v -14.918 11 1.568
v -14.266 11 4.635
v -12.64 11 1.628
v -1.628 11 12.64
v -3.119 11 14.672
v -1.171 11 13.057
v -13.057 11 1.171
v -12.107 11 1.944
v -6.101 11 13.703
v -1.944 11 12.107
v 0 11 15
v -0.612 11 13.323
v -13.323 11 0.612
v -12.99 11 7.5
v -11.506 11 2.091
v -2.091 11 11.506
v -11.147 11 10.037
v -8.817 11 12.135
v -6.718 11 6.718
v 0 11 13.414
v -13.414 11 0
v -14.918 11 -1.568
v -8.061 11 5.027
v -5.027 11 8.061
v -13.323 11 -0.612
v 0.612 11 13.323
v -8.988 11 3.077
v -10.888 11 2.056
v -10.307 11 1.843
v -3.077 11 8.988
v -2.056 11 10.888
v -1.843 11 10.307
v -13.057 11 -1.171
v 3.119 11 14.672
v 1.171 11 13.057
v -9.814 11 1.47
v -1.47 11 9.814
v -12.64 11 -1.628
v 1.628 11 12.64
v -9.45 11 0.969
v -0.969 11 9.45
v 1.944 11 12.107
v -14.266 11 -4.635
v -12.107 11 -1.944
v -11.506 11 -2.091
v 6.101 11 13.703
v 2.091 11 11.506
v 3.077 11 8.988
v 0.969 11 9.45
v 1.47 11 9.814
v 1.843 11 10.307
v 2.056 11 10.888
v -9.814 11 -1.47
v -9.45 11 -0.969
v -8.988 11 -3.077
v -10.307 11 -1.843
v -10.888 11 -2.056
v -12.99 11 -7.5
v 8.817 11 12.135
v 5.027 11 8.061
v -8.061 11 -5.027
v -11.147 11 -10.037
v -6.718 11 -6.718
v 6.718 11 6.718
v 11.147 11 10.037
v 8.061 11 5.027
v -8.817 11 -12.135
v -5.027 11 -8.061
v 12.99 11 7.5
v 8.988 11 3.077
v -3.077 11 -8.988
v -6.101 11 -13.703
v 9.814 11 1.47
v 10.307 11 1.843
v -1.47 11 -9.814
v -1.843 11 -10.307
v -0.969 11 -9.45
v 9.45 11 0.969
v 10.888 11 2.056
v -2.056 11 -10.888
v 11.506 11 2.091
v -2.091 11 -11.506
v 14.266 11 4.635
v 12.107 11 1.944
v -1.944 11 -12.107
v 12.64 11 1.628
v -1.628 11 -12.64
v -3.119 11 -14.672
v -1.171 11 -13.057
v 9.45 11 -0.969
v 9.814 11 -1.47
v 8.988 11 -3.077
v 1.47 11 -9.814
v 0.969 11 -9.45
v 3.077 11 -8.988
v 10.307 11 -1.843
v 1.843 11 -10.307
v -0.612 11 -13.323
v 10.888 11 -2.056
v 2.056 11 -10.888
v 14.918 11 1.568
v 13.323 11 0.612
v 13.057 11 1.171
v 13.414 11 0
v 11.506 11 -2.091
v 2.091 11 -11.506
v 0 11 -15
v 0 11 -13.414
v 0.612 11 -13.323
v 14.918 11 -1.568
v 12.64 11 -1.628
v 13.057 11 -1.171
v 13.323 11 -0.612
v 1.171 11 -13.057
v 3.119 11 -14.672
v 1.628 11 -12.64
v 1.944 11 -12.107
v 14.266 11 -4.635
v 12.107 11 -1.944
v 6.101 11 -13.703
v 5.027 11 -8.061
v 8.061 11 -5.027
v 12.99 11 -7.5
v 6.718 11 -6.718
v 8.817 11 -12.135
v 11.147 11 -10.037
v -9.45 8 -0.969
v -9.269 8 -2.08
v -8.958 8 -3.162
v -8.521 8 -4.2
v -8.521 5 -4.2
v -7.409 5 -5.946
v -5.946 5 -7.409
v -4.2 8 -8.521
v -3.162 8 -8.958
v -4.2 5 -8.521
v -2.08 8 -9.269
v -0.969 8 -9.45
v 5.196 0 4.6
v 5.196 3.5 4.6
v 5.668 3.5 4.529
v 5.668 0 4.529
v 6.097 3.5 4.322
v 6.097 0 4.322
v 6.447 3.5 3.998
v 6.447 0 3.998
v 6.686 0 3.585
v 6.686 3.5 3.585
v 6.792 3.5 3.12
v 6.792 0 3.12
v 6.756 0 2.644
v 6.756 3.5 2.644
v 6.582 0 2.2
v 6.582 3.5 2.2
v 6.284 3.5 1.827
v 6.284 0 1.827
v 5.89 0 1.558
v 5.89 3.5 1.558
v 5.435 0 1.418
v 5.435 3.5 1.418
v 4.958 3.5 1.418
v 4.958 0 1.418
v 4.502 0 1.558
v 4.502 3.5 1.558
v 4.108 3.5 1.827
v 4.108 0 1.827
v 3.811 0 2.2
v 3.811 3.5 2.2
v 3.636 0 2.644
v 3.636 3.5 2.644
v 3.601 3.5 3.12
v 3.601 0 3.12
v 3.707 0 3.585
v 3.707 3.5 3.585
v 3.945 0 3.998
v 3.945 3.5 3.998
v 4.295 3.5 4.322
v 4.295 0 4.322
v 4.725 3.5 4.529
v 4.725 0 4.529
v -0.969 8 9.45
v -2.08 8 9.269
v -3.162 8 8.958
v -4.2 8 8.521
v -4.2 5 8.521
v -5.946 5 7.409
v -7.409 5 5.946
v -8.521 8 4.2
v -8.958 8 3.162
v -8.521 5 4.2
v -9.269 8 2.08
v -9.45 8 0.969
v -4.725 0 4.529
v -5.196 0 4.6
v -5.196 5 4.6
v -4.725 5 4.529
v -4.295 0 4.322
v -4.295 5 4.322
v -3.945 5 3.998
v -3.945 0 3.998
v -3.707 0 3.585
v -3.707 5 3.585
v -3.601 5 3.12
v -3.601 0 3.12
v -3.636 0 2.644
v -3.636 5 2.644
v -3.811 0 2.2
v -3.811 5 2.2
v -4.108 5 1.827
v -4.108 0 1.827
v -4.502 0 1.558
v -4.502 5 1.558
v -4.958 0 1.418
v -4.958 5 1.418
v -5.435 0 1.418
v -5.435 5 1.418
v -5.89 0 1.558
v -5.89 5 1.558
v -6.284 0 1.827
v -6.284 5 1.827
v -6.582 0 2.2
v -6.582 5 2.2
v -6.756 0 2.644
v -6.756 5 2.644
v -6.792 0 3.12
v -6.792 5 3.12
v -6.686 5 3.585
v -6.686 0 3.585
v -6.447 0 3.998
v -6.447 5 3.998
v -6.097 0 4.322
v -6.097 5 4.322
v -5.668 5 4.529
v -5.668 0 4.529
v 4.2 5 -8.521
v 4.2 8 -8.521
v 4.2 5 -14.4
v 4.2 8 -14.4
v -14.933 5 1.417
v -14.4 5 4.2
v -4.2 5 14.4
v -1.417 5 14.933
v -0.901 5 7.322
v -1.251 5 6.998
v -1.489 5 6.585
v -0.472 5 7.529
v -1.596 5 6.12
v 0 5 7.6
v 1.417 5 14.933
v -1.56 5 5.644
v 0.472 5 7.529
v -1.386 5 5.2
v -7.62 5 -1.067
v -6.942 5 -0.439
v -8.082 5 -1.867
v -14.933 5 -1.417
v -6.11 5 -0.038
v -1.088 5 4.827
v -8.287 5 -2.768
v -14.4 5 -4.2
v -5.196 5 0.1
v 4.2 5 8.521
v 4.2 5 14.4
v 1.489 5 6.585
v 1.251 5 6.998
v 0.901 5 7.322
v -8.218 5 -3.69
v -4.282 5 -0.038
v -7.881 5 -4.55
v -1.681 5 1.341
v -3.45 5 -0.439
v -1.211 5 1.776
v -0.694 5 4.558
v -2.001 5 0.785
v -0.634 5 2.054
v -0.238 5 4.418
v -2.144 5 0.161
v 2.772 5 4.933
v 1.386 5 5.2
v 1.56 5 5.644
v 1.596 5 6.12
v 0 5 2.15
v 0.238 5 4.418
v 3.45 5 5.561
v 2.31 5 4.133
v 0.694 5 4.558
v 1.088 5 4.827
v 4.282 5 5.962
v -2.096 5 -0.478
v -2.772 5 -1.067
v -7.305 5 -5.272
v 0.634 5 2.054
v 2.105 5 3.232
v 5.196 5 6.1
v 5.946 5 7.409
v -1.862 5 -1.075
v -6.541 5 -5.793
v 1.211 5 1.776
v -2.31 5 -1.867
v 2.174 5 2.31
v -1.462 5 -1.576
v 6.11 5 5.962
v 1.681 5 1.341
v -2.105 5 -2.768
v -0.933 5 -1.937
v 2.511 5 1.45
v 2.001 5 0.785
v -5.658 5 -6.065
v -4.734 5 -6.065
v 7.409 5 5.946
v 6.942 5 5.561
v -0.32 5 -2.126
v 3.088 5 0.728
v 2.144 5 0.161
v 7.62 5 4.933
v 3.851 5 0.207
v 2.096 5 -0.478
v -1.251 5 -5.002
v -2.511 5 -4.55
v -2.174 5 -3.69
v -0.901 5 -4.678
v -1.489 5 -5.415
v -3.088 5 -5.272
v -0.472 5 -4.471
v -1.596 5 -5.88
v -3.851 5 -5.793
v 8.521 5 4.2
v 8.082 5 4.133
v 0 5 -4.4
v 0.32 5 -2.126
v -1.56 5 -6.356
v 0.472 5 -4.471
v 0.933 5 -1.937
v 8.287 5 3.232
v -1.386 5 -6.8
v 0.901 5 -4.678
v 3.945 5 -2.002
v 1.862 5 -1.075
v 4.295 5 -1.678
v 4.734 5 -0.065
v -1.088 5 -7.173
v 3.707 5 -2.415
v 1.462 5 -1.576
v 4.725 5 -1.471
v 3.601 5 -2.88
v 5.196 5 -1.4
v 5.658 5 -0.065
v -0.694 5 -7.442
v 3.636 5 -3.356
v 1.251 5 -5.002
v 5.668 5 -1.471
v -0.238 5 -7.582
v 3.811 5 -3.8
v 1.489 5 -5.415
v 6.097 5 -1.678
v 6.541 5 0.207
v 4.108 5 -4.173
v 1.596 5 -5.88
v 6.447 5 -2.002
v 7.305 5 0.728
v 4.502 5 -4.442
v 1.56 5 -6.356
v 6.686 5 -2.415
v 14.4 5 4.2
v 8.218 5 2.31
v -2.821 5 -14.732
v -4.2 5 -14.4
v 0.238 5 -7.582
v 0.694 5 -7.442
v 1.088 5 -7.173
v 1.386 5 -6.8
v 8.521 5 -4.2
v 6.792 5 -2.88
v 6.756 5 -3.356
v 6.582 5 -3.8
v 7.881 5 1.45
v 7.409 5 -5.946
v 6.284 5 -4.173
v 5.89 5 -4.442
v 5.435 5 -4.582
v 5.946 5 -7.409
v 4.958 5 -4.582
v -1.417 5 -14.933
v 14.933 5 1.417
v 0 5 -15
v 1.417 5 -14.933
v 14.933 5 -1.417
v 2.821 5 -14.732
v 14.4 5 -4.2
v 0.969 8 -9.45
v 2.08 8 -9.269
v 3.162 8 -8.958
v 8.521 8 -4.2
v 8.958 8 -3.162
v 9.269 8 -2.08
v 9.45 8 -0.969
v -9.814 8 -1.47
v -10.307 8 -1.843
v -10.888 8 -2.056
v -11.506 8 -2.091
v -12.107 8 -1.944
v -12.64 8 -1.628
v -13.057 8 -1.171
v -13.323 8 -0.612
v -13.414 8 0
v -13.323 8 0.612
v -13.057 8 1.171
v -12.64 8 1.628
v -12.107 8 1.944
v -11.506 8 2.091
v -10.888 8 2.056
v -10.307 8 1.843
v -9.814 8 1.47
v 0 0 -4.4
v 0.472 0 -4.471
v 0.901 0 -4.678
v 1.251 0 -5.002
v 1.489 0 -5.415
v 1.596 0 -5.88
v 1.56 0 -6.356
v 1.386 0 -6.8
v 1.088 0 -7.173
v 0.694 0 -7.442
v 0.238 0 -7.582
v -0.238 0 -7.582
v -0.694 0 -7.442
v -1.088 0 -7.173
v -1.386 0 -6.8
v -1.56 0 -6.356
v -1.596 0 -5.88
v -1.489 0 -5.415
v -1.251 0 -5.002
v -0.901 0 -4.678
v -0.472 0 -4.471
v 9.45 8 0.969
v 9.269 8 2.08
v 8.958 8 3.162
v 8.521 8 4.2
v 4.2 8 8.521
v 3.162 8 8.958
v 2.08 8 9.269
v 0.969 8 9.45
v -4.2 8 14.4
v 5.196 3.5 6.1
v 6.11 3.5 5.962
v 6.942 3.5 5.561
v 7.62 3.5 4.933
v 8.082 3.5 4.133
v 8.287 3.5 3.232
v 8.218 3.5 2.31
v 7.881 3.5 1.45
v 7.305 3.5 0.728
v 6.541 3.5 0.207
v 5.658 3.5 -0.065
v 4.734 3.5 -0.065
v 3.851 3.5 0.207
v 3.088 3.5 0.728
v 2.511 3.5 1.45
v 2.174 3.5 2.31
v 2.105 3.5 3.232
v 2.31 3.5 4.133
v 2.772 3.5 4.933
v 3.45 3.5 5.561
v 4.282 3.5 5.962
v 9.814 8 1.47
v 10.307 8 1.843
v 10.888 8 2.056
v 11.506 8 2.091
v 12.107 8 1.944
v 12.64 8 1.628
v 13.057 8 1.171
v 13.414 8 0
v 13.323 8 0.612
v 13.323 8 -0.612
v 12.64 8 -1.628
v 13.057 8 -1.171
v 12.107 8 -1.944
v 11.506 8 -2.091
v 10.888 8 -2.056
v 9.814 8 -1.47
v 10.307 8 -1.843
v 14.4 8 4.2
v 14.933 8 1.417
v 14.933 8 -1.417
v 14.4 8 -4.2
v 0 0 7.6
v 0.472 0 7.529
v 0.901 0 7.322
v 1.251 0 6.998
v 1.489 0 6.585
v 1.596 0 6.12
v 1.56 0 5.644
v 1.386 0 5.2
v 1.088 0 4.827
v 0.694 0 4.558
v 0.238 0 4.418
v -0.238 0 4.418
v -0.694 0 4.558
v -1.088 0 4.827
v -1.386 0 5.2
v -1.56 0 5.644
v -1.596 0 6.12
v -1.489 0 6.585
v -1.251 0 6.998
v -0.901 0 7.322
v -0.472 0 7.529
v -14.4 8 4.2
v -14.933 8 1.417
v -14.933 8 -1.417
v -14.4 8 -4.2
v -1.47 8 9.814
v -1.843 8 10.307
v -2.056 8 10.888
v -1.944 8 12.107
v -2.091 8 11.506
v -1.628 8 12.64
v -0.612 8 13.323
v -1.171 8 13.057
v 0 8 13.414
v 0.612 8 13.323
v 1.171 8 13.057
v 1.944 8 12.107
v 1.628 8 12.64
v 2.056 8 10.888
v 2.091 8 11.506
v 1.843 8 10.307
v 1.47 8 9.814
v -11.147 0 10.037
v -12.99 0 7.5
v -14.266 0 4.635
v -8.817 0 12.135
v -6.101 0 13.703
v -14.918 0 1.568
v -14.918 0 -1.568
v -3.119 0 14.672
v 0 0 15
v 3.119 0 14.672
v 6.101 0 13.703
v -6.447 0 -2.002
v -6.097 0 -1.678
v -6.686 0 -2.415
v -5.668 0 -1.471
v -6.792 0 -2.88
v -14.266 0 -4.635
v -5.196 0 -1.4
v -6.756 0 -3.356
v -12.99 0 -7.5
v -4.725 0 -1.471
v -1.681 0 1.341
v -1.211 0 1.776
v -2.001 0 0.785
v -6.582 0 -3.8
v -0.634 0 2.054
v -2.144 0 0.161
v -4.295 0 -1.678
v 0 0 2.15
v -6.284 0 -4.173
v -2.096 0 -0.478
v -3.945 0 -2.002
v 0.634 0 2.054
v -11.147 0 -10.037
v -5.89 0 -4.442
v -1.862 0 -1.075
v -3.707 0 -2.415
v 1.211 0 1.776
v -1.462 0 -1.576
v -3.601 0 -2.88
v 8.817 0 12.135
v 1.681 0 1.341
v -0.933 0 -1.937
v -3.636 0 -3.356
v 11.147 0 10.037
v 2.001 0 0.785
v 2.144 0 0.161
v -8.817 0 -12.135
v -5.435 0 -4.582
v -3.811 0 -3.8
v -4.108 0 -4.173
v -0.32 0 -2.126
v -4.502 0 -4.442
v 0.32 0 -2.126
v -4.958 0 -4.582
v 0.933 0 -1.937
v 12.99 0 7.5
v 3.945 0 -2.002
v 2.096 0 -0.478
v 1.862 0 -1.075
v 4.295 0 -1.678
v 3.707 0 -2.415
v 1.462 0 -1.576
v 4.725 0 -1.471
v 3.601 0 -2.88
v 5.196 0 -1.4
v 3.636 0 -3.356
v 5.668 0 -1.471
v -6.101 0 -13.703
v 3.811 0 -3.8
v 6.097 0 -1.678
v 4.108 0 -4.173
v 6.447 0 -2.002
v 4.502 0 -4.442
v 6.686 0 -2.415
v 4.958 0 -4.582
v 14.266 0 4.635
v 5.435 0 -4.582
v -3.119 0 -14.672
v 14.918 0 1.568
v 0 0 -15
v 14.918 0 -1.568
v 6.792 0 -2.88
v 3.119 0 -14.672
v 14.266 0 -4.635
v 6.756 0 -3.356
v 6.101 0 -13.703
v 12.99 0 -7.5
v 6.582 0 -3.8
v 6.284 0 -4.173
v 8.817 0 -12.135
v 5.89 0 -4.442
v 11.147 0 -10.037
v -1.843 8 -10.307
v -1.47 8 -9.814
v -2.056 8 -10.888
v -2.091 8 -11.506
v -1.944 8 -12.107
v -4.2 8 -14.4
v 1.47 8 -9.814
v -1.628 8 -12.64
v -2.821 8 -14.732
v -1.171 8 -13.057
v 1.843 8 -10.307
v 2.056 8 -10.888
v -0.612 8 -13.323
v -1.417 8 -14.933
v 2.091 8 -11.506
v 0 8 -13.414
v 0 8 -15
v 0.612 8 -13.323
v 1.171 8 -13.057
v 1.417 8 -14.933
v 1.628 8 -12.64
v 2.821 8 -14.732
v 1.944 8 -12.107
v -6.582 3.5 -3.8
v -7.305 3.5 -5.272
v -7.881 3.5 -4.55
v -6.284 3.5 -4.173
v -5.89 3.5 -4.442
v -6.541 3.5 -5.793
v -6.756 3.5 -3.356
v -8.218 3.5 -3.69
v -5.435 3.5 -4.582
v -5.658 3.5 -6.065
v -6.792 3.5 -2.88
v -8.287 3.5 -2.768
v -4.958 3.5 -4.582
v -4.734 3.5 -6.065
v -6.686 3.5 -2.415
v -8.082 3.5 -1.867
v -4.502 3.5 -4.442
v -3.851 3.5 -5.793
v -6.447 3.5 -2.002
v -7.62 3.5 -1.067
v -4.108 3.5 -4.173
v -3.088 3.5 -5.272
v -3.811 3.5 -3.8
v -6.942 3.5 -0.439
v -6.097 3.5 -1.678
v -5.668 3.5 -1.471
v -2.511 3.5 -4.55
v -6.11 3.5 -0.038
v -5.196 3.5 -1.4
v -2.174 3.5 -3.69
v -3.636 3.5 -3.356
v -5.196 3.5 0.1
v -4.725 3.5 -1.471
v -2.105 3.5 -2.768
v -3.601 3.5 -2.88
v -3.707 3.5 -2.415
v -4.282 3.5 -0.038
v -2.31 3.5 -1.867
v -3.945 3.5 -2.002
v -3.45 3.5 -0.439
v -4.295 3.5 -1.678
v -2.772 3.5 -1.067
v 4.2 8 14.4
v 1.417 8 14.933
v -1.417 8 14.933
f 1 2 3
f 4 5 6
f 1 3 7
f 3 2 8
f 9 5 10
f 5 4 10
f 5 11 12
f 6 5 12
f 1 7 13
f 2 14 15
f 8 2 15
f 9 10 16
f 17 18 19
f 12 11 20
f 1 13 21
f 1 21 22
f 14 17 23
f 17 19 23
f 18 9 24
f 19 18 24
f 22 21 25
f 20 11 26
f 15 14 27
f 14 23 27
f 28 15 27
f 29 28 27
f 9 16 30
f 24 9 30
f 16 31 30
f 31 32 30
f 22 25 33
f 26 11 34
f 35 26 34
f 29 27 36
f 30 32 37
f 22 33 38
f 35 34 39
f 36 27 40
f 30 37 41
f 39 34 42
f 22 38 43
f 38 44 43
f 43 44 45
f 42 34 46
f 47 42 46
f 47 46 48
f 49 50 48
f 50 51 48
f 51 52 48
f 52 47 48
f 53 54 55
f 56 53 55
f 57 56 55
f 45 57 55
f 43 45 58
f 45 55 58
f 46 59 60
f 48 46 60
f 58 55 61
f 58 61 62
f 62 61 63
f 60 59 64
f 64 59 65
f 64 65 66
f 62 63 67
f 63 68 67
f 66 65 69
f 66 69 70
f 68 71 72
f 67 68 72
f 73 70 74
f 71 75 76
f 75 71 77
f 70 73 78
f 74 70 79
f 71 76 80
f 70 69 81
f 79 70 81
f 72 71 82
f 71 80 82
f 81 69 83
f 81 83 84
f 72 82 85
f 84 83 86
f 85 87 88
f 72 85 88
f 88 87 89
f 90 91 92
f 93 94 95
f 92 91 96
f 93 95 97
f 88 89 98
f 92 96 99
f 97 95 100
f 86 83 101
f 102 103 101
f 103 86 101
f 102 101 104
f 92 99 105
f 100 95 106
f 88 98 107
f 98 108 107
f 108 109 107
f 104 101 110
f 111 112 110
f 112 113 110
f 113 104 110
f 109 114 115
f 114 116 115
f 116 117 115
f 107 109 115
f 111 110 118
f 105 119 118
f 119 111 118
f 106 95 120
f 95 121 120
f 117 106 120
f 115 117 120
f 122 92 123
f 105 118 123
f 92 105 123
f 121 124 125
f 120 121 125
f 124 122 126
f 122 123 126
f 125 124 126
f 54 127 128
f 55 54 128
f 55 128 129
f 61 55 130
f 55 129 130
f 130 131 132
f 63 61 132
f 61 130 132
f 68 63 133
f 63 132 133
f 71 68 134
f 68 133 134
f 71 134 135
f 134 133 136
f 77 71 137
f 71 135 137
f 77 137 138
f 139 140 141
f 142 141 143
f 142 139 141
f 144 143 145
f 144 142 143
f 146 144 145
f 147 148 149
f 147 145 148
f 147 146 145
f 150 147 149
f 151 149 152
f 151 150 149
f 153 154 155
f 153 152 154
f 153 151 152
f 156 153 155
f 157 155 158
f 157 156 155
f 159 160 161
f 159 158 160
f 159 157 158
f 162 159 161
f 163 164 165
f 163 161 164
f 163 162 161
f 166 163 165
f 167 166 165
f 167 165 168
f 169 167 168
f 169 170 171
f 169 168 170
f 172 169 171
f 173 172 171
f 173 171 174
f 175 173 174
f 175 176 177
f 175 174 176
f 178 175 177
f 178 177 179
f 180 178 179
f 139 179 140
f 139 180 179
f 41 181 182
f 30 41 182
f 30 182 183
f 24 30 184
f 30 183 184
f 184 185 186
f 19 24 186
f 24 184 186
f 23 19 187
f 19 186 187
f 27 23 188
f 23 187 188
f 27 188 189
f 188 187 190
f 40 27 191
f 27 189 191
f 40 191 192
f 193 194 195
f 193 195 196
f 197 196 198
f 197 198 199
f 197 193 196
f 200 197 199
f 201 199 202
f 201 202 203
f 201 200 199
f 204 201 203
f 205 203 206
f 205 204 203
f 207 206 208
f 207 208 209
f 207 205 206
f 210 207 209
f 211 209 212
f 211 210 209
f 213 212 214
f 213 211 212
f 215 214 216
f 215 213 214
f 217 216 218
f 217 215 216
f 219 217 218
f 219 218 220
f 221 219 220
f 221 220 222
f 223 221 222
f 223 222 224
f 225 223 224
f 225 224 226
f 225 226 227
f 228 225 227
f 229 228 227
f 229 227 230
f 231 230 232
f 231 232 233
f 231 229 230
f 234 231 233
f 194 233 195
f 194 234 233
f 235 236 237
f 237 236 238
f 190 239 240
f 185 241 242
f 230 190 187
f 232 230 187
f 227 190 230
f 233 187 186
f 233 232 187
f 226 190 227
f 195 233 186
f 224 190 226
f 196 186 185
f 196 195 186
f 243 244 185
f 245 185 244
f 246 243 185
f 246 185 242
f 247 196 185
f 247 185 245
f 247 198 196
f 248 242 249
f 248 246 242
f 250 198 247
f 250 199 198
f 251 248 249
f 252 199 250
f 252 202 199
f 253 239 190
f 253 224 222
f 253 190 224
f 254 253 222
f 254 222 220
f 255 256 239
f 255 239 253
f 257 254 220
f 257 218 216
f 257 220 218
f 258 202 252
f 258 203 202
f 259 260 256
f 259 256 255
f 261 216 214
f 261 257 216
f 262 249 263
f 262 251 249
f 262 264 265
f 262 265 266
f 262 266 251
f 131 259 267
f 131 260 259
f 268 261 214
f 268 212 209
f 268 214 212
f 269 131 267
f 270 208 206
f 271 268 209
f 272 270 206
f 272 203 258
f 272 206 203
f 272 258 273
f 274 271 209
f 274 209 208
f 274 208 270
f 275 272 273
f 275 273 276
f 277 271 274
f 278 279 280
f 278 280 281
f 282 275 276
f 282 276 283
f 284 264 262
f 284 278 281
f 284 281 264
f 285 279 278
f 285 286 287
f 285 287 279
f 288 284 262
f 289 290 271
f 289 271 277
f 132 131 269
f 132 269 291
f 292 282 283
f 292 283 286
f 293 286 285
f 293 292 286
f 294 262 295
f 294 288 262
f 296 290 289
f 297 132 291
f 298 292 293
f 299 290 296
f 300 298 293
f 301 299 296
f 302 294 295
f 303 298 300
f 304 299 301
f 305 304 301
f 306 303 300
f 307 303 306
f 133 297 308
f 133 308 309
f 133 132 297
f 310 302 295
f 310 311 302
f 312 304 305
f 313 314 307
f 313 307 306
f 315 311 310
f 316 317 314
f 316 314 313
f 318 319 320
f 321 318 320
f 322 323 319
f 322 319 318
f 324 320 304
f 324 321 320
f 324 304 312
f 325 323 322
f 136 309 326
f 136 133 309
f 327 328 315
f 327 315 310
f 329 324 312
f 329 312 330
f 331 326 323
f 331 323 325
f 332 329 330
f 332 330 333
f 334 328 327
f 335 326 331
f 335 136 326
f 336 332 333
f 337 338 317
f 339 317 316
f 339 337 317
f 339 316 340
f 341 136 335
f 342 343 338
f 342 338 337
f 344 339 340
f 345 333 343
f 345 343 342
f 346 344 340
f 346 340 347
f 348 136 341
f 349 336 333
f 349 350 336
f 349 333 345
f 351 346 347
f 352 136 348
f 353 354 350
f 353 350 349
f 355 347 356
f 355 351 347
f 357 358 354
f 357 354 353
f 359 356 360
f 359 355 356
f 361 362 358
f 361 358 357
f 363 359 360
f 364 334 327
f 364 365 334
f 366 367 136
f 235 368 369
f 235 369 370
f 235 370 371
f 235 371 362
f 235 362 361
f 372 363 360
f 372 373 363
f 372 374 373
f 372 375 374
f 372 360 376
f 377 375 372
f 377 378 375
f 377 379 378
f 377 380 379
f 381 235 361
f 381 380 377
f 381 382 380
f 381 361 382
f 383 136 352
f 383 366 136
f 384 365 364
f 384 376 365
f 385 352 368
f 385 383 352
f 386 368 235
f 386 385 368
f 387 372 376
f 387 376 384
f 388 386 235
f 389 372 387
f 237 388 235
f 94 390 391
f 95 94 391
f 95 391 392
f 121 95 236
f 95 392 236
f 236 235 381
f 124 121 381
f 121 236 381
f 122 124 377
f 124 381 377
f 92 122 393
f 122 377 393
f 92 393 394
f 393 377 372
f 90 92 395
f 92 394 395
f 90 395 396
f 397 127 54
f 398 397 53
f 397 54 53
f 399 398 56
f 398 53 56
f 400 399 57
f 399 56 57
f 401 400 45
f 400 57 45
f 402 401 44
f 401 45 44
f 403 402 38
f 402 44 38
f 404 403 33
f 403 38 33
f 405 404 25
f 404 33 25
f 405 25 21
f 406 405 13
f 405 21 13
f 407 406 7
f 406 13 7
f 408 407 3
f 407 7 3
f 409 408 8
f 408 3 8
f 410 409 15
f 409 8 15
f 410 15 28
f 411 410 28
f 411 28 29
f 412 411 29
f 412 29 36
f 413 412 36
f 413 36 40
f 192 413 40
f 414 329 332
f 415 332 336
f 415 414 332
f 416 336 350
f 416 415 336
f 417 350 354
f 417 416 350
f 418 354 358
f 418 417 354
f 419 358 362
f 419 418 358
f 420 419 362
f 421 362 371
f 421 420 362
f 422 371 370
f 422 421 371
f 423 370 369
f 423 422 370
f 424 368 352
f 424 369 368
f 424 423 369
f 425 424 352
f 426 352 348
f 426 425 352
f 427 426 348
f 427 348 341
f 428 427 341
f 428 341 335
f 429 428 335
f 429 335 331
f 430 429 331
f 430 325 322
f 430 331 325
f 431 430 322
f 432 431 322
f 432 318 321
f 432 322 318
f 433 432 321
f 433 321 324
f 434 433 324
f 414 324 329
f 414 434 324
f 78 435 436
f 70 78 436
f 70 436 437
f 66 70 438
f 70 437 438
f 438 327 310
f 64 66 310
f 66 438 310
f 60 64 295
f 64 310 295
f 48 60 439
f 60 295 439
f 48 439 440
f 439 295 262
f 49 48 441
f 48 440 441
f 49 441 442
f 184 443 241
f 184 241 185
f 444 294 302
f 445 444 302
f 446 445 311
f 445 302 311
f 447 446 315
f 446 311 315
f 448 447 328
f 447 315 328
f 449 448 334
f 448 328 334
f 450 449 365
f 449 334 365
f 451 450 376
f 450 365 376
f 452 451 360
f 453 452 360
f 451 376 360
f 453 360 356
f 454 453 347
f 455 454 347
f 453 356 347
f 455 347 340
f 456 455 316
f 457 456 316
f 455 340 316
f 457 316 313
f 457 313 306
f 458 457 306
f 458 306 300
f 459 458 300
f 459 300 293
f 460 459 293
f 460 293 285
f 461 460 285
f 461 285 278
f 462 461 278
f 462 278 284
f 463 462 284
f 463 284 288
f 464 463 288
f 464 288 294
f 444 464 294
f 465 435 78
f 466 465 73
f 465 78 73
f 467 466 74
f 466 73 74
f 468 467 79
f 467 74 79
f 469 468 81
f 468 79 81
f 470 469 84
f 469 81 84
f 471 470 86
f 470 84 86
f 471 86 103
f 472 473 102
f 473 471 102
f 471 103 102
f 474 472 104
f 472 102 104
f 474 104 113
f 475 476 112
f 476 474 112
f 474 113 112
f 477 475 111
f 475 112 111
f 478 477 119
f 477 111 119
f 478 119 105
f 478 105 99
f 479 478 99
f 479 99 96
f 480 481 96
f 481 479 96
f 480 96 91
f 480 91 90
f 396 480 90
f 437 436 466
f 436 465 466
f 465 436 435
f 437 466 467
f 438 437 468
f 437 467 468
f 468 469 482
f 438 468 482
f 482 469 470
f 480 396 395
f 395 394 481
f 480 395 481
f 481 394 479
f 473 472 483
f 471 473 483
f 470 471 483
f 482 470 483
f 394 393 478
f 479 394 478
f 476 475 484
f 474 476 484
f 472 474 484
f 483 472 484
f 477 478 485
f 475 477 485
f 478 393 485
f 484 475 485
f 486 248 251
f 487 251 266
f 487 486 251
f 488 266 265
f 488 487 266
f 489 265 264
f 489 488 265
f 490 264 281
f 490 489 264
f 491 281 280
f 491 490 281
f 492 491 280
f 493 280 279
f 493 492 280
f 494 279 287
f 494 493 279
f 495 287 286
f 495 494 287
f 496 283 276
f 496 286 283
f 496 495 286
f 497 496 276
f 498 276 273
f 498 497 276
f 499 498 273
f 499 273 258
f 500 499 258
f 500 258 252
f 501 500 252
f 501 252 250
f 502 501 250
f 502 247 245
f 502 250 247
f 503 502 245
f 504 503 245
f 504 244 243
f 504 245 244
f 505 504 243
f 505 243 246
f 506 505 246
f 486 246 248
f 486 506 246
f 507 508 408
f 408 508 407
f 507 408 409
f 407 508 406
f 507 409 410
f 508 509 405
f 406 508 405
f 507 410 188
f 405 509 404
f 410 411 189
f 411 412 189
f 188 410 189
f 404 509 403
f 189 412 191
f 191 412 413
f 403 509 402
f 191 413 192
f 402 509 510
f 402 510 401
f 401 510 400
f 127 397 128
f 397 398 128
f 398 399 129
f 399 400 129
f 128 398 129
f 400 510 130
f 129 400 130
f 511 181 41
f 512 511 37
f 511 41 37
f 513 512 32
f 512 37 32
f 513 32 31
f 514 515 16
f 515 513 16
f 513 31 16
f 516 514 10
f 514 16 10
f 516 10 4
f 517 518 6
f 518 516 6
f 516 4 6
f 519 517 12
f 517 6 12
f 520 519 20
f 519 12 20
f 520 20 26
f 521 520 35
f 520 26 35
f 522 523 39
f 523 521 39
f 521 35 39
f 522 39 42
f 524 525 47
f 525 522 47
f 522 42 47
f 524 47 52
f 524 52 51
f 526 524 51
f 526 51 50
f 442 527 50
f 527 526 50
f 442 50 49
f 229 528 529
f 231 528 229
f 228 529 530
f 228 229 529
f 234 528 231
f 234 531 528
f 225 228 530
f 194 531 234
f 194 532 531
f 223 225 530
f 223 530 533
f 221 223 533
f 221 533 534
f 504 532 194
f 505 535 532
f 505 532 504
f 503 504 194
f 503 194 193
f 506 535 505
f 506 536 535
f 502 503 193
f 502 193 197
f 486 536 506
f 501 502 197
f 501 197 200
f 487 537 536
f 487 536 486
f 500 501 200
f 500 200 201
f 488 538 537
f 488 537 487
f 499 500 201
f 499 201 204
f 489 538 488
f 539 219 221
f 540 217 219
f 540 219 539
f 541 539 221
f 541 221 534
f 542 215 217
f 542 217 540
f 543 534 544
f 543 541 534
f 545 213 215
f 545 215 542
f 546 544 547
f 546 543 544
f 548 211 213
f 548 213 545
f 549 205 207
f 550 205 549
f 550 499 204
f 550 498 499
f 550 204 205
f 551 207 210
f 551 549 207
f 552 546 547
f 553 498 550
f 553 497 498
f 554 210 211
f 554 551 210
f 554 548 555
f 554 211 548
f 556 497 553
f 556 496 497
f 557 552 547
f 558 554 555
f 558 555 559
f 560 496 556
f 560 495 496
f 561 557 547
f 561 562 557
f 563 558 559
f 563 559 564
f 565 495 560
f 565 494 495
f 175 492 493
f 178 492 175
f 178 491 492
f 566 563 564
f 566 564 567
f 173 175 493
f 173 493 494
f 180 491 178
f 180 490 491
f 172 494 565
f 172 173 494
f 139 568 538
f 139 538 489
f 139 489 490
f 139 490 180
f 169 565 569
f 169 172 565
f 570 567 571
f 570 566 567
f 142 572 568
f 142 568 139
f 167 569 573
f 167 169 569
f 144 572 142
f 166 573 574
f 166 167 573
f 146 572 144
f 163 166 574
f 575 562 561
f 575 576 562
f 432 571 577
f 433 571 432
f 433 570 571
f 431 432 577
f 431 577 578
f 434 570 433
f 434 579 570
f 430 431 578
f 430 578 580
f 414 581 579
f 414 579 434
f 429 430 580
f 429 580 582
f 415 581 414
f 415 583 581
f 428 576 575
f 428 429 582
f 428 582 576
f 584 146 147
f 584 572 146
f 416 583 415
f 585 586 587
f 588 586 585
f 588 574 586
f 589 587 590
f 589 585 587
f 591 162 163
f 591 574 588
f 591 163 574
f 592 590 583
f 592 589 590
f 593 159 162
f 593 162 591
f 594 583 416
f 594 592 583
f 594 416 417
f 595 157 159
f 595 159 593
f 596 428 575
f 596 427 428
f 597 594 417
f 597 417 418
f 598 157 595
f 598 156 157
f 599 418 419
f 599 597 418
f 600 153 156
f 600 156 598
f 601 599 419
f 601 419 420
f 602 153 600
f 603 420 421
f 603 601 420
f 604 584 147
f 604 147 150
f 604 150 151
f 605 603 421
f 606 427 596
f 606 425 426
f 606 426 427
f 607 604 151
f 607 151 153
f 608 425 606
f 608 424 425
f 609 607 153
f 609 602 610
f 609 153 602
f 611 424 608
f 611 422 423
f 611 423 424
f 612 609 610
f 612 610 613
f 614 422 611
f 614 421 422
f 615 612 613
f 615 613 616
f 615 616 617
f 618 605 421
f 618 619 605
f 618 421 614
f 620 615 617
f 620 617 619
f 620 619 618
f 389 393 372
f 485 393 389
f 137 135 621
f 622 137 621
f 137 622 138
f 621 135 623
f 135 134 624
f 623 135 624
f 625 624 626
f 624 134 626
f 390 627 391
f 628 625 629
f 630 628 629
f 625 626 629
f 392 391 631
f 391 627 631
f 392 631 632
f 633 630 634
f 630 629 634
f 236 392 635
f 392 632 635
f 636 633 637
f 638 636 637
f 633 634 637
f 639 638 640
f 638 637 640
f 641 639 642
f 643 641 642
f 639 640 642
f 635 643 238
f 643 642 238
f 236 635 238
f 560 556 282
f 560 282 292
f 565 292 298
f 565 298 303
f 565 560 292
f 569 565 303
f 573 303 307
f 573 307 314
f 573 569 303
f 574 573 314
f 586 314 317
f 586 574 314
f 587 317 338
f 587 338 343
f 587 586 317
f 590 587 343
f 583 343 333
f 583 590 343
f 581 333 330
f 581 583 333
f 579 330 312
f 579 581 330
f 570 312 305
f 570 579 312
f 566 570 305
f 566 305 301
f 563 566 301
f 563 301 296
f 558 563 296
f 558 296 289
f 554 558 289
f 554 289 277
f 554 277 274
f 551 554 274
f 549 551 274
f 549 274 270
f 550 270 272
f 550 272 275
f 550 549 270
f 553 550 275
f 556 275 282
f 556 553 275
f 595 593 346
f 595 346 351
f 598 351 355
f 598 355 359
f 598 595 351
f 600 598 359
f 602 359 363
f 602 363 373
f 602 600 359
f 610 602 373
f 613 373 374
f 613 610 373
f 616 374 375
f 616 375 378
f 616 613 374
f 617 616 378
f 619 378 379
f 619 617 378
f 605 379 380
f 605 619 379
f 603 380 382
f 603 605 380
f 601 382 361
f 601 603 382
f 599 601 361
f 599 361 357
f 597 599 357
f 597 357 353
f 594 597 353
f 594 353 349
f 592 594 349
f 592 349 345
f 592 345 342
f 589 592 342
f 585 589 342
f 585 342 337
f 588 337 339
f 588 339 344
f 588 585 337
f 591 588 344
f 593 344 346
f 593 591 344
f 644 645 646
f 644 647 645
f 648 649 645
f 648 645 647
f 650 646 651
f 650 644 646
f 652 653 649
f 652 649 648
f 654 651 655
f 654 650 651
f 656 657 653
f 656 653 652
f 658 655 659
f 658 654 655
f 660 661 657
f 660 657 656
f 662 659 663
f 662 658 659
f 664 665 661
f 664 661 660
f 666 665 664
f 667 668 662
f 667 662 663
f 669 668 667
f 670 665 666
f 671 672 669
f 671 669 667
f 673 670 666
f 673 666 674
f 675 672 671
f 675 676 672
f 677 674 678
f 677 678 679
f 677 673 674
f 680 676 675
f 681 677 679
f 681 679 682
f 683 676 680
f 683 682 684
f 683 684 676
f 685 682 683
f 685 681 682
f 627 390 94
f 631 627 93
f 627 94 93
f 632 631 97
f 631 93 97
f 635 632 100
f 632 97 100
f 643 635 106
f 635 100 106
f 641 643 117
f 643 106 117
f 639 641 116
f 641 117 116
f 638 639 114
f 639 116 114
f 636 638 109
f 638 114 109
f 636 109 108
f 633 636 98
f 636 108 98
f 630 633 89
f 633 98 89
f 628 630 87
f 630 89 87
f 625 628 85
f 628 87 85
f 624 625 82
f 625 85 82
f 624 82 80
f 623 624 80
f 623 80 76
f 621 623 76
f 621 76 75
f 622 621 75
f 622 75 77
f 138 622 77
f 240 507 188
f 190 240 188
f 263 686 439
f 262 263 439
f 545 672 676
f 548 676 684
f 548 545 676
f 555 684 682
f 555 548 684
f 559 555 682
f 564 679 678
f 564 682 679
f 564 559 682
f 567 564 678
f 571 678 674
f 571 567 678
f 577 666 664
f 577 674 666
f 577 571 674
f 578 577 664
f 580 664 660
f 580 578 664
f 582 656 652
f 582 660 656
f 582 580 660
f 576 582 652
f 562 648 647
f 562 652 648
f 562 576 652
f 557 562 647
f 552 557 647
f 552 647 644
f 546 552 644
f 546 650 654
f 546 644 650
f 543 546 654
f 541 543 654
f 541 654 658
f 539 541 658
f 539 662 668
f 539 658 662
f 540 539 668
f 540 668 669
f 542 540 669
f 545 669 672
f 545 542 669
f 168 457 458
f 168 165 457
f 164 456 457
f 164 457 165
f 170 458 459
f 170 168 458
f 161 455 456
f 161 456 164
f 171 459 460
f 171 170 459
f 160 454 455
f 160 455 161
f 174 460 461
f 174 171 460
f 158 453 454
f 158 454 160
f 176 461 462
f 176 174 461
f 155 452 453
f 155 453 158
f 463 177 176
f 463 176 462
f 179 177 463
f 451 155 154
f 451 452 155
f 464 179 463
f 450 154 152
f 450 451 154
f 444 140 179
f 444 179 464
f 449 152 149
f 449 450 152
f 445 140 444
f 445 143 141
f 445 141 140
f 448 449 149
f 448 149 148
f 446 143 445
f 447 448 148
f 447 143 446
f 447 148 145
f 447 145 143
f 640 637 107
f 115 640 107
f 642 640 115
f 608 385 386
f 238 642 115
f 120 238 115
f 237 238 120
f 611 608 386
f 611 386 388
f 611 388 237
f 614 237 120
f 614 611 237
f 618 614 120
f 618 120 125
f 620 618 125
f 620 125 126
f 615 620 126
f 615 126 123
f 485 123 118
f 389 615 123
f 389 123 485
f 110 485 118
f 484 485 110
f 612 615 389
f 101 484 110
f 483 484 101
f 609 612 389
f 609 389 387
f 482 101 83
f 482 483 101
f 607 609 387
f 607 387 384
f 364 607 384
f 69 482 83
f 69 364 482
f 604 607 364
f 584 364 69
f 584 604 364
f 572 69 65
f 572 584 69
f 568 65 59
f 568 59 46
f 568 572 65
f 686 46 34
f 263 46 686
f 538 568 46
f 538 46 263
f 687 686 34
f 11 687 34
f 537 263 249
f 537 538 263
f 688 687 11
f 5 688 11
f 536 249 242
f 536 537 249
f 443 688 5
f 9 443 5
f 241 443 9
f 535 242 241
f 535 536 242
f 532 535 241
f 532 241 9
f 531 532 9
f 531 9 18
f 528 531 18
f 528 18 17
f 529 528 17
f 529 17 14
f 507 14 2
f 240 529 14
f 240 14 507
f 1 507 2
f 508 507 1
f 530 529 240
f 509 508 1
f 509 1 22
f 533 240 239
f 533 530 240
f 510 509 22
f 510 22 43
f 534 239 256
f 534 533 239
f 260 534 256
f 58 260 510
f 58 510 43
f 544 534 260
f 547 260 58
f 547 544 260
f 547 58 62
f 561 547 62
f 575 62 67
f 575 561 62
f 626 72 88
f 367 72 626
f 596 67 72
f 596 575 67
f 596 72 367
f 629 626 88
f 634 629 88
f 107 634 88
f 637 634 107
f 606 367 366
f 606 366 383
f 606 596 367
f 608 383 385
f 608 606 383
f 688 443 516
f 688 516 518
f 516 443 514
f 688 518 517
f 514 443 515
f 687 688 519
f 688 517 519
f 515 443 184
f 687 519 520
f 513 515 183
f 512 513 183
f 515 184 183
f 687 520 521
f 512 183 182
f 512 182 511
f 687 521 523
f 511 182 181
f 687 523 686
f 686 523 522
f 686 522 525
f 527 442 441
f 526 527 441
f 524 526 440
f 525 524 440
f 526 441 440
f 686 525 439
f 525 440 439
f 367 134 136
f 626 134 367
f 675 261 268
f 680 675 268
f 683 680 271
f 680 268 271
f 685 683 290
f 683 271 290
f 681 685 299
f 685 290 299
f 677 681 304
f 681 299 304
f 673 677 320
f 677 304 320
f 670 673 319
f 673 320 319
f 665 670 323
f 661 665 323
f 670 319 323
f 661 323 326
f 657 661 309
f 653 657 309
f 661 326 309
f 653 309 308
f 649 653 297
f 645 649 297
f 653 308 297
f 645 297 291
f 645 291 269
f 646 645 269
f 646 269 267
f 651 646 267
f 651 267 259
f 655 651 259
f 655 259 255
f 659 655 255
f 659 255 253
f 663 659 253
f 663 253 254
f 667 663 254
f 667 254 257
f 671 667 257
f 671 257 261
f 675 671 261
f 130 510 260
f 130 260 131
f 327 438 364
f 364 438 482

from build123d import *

# Parameters (mm, degrees)
SKETCH1_R           = 10
SKETCH1_R_2         = 1.6
SKETCH1_R_3         = 2.15
BOSS_EXTRUDE1_DEPTH = 5
SKETCH2_R           = 3.1
CUT_EXTRUDE2_DEPTH  = 1.5
SKETCH3_R           = 15
SKETCH3_R_2         = 9.5
BOSS_EXTRUDE2_DEPTH = 11
SKETCH5_R           = 2.1
CUT_EXTRUDE3_DEPTH  = 3
SKETCH7_W           = 10
SKETCH7_H           = 8.4
SKETCH7_W_2         = 8.4
SKETCH7_H_2         = 10
CUT_EXTRUDE4_DEPTH  = 3


with BuildPart() as part:
    # Sketch1 → Boss-Extrude1 (new body)
    with BuildSketch(Plane(origin=(0, 0, 0), x_dir=(1, 0, 0), z_dir=(0, 1, 0))):
        with Locations(Location((0, 0, 0), (0, 0, 270))):
            Circle(SKETCH1_R)
        with Locations(Location((0, 6, 0), (0, 0, 270))):
            Circle(SKETCH1_R_2, mode=Mode.SUBTRACT)
        with Locations(Location((5.196152423, 3, 0), (0, 0, 270))):
            Circle(SKETCH1_R_2, mode=Mode.SUBTRACT)
        with Locations(Location((5.196152423, -3, 0), (0, 0, 270))):
            Circle(SKETCH1_R_2, mode=Mode.SUBTRACT)
        with Locations(Location((0, -6, 0), (0, 0, 270))):
            Circle(SKETCH1_R_2, mode=Mode.SUBTRACT)
        with Locations(Location((-5.196152423, -3, 0), (0, 0, 270))):
            Circle(SKETCH1_R_2, mode=Mode.SUBTRACT)
        with Locations(Location((-5.196152423, 3, 0), (0, 0, 270))):
            Circle(SKETCH1_R_2, mode=Mode.SUBTRACT)
        with Locations(Location((0, 0, 0), (0, 0, 270))):
            Circle(SKETCH1_R_3, mode=Mode.SUBTRACT)
    extrude(amount=BOSS_EXTRUDE1_DEPTH)

    # Sketch2 → Cut-Extrude2 (cut)
    with BuildSketch(Plane(origin=(0, 5, 0), x_dir=(1, 0, 0), z_dir=(0, 1, 0))):
        with Locations(Location((-5.196152423, 3, 0), (0, 0, 270))):
            Circle(SKETCH2_R)
        with Locations(Location((5.196152423, -3, 0), (0, 0, 270))):
            Circle(SKETCH2_R)
    extrude(amount=-CUT_EXTRUDE2_DEPTH, mode=Mode.SUBTRACT)

    # Sketch3 → Boss-Extrude2 (add)
    with BuildSketch(Plane.XZ):
        with Locations(Location((0, 0, 0), (0, 0, 270))):
            Circle(SKETCH3_R)
        with Locations(Location((0, 0, 0), (0, 0, 270))):
            Circle(SKETCH3_R_2, mode=Mode.SUBTRACT)
    extrude(amount=-BOSS_EXTRUDE2_DEPTH)

    # Sketch5 → Cut-Extrude3 (cut)
    with BuildSketch(Plane(origin=(0, 11, 0), x_dir=(1, 0, 0), z_dir=(0, 1, 0))):
        with Locations((0, 11.313708499)):
            Circle(SKETCH5_R)
        with Locations((11.313708499, 0)):
            Circle(SKETCH5_R)
        with Locations((0, -11.313708499)):
            Circle(SKETCH5_R)
        with Locations((-11.313708499, 0)):
            Circle(SKETCH5_R)
    extrude(amount=-CUT_EXTRUDE3_DEPTH, mode=Mode.SUBTRACT)

    # Sketch7 → Cut-Extrude4 (cut)
    with BuildSketch(Plane(origin=(0, 8, 0), x_dir=(1, 0, 0), z_dir=(0, 1, 0))):
        with Locations((-12.313708499, 0)):
            Rectangle(SKETCH7_W, SKETCH7_H)
        with Locations((0, 12.313708499)):
            Rectangle(SKETCH7_W_2, SKETCH7_H_2)
        with Locations((12.313708499, 0)):
            Rectangle(SKETCH7_W, SKETCH7_H)
        with Locations((0, -12.313708499)):
            Rectangle(SKETCH7_W_2, SKETCH7_H_2)
    extrude(amount=-CUT_EXTRUDE4_DEPTH, mode=Mode.SUBTRACT)


solid = part.part
